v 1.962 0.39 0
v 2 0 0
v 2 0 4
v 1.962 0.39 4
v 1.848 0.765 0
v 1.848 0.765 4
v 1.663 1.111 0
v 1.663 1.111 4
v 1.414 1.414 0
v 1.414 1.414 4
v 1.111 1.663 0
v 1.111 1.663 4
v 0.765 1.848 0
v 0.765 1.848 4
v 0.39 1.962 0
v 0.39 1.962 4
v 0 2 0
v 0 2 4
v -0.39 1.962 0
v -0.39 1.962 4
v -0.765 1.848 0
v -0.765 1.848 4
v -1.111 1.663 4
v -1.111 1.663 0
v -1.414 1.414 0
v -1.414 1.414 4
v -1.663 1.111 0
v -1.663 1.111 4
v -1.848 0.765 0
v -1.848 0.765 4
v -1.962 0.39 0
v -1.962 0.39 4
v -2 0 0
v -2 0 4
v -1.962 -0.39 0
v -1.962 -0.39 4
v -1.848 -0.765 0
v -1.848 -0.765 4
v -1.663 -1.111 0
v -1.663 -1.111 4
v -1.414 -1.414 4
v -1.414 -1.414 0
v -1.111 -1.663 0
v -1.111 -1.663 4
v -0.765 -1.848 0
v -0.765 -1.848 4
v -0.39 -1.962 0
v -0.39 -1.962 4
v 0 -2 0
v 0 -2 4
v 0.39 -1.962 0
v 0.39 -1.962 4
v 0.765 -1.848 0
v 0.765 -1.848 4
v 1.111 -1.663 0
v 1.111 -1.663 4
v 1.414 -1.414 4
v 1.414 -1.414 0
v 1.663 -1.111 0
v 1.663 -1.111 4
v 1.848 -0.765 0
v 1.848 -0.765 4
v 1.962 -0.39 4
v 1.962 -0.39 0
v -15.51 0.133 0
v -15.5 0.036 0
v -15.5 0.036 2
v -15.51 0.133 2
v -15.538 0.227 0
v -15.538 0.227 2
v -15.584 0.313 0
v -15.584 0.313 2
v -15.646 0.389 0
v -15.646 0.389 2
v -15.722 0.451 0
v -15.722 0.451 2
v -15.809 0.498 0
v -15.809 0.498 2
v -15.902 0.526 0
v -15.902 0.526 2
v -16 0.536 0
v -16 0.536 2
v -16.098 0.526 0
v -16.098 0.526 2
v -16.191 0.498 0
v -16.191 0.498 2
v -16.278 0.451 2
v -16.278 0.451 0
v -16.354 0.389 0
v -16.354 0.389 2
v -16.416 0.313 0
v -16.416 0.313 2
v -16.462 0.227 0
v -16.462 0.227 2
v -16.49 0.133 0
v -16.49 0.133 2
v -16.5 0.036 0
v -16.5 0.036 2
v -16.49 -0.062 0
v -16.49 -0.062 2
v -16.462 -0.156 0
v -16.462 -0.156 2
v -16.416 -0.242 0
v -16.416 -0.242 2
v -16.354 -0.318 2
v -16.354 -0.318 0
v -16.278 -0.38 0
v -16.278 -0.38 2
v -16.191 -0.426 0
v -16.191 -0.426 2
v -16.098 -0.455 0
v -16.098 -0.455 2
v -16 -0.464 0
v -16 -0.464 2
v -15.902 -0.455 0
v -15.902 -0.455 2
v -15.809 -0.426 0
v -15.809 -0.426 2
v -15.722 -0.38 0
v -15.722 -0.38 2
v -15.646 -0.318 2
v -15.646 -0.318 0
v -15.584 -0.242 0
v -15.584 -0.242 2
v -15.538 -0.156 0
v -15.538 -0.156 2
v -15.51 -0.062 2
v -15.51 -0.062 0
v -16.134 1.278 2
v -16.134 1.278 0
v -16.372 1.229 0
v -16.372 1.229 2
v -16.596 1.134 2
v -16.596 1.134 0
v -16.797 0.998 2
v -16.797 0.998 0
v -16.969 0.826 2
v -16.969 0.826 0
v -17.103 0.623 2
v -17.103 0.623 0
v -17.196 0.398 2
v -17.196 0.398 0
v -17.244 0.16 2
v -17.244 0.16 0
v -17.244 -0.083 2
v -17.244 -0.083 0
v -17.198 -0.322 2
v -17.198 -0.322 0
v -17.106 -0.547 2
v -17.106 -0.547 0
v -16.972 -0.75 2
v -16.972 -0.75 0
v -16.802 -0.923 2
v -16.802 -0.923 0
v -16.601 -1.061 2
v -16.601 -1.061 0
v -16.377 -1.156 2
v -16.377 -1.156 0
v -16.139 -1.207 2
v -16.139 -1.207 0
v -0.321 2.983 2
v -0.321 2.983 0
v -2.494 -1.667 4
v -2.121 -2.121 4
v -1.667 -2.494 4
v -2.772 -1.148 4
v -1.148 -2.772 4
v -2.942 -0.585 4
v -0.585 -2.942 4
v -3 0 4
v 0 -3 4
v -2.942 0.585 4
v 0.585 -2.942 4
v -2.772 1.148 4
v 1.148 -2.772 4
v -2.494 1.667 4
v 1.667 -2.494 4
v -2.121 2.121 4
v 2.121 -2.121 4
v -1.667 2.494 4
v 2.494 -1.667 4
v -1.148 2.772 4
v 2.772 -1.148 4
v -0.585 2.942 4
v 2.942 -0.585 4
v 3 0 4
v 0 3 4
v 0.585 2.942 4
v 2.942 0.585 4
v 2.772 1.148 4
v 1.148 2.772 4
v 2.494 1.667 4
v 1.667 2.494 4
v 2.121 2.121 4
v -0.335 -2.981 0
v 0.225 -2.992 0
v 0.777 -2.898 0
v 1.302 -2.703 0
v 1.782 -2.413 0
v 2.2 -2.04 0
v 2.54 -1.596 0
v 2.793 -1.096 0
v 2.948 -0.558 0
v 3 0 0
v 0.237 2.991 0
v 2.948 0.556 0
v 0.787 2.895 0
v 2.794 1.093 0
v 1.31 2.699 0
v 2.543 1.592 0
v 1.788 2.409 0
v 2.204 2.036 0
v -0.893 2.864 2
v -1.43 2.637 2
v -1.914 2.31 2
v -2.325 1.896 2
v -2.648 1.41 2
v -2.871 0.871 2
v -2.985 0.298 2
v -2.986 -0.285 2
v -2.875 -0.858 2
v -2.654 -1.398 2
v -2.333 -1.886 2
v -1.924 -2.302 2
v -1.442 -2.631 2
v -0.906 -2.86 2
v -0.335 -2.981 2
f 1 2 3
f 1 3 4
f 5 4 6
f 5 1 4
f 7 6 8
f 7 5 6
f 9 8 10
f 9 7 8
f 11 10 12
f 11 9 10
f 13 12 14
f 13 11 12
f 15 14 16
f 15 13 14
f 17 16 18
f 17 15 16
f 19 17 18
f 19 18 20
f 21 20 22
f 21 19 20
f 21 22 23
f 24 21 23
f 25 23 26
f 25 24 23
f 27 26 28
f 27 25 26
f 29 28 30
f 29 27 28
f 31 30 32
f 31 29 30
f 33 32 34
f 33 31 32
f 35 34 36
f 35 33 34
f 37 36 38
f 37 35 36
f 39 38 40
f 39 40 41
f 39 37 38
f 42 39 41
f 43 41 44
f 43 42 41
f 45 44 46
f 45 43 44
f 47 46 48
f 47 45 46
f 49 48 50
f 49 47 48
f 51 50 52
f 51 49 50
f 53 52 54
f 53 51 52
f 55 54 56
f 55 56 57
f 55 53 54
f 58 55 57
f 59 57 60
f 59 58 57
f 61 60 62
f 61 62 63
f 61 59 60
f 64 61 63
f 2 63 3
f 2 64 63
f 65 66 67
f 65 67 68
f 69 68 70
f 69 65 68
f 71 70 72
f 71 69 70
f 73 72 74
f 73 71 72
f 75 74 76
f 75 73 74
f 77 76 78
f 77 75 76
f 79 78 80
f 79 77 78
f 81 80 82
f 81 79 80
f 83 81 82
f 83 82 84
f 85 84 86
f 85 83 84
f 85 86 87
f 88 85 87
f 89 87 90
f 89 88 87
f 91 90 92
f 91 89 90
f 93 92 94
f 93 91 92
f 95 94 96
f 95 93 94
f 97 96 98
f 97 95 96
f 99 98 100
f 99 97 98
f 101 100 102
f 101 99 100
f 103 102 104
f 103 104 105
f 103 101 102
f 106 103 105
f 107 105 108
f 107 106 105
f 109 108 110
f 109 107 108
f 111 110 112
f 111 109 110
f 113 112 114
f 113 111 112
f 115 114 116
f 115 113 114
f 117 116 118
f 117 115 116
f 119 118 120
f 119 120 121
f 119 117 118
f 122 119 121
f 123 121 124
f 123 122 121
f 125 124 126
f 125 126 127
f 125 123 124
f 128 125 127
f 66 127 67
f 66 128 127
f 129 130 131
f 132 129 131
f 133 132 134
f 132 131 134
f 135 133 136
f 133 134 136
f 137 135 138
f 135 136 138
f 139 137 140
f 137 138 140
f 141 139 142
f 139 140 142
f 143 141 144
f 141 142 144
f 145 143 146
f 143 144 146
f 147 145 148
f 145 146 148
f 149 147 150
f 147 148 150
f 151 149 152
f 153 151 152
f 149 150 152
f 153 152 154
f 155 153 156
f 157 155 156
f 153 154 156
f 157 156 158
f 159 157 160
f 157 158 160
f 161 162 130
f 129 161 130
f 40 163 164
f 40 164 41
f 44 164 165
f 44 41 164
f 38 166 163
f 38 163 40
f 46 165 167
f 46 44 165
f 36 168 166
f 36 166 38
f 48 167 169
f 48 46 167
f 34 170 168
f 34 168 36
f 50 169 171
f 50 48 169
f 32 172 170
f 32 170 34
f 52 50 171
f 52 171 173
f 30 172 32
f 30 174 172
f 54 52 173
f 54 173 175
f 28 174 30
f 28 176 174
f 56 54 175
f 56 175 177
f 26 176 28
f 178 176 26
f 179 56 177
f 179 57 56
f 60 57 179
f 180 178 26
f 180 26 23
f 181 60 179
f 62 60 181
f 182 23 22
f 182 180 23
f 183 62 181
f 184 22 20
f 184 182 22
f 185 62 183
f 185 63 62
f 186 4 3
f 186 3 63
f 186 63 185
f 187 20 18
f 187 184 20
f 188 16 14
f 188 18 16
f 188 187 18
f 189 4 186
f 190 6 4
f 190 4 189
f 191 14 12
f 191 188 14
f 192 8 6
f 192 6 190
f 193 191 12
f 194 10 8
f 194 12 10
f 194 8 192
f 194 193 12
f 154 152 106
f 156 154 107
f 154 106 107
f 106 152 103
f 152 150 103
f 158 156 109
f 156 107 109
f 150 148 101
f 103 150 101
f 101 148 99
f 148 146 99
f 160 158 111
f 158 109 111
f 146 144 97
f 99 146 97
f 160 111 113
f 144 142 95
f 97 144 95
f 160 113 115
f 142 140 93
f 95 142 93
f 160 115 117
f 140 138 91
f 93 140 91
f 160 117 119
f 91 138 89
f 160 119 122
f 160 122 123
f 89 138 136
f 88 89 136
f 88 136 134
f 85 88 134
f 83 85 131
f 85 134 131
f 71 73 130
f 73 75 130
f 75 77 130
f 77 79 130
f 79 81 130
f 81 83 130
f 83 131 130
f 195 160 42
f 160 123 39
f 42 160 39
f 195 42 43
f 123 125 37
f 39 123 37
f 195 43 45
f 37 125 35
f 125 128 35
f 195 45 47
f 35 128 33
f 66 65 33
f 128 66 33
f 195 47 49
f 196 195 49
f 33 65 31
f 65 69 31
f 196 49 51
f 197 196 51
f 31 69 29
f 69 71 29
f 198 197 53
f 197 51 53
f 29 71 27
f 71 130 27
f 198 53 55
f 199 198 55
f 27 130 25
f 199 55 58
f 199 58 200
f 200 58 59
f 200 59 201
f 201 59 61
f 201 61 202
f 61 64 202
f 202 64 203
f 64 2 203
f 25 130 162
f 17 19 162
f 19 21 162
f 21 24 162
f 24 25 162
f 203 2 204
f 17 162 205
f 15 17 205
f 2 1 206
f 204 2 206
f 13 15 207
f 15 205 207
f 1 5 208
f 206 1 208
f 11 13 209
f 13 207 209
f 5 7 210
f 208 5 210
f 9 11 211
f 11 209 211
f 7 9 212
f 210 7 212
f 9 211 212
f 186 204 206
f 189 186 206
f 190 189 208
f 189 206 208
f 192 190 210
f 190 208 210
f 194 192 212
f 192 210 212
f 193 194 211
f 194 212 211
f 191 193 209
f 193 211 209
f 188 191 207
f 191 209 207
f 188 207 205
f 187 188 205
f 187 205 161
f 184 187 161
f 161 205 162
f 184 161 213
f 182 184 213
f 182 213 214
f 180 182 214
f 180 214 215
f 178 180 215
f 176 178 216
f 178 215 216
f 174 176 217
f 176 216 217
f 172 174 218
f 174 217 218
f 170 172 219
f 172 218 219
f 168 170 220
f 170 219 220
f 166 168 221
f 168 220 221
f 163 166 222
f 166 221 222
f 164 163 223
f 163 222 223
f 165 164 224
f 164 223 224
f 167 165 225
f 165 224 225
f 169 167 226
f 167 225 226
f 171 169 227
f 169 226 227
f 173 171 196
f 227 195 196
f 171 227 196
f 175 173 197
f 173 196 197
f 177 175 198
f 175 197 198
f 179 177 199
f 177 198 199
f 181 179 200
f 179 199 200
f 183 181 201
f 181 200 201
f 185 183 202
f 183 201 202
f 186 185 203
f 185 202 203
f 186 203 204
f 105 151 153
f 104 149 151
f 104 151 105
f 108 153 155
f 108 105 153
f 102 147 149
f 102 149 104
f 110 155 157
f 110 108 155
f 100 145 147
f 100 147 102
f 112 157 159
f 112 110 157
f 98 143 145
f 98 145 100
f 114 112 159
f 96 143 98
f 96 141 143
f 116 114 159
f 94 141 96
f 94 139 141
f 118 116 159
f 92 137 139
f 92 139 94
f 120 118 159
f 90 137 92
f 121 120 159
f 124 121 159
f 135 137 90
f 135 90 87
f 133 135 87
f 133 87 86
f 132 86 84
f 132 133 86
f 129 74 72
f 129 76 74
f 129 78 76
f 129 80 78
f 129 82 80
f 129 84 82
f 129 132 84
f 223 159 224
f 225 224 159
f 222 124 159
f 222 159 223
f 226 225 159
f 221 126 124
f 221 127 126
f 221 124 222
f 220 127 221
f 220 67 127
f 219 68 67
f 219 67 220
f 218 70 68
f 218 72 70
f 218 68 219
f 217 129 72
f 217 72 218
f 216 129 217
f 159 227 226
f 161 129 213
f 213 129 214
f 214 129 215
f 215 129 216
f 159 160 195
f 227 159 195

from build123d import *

# Parameters (mm, degrees)
SKETCH_1_R      = 2
EXTRUDE_1_DEPTH = 4
SKETCH_1_3_R    = 0.5
EXTRUDE_2_DEPTH = 2


with BuildPart() as part:
    # 草图1 → 凸台-拉伸1 (new body)
    with BuildSketch(Plane.XY):
        with BuildLine():
            ThreePointArc((-0.321491523, 2.982724124), (-2.999992581, 0.006671881), (-0.334755231, -2.981264654))
            ThreePointArc((-0.334755231, -2.981264654), (1.999466717, -2.236544846), (3, 0))
            ThreePointArc((3, 0), (2.00443576, 2.23209258), (-0.321491523, 2.982724124))
        make_face()
        Circle(SKETCH_1_R, mode=Mode.SUBTRACT)
    extrude(amount=EXTRUDE_1_DEPTH)

    # 草图1<3> → 凸台-拉伸2 (add)
    with BuildSketch(Plane.XY):
        with BuildLine():
            ThreePointArc((-16.133954801, 1.278385172), (-17.249996909, 0.038363404), (-16.139481346, -1.206610152))
            Line((-16.139481346, -1.206610152), (-0.334755231, -2.981264654))
            ThreePointArc((-0.334755231, -2.981264654), (-2.999992581, 0.006671881), (-0.321491523, 2.982724124))
            Line((-0.321491523, 2.982724124), (-16.133954801, 1.278385172))
        make_face()
        with Locations((-16, 0.035583454)):
            Circle(SKETCH_1_3_R, mode=Mode.SUBTRACT)
    extrude(amount=EXTRUDE_2_DEPTH)


solid = part.part
